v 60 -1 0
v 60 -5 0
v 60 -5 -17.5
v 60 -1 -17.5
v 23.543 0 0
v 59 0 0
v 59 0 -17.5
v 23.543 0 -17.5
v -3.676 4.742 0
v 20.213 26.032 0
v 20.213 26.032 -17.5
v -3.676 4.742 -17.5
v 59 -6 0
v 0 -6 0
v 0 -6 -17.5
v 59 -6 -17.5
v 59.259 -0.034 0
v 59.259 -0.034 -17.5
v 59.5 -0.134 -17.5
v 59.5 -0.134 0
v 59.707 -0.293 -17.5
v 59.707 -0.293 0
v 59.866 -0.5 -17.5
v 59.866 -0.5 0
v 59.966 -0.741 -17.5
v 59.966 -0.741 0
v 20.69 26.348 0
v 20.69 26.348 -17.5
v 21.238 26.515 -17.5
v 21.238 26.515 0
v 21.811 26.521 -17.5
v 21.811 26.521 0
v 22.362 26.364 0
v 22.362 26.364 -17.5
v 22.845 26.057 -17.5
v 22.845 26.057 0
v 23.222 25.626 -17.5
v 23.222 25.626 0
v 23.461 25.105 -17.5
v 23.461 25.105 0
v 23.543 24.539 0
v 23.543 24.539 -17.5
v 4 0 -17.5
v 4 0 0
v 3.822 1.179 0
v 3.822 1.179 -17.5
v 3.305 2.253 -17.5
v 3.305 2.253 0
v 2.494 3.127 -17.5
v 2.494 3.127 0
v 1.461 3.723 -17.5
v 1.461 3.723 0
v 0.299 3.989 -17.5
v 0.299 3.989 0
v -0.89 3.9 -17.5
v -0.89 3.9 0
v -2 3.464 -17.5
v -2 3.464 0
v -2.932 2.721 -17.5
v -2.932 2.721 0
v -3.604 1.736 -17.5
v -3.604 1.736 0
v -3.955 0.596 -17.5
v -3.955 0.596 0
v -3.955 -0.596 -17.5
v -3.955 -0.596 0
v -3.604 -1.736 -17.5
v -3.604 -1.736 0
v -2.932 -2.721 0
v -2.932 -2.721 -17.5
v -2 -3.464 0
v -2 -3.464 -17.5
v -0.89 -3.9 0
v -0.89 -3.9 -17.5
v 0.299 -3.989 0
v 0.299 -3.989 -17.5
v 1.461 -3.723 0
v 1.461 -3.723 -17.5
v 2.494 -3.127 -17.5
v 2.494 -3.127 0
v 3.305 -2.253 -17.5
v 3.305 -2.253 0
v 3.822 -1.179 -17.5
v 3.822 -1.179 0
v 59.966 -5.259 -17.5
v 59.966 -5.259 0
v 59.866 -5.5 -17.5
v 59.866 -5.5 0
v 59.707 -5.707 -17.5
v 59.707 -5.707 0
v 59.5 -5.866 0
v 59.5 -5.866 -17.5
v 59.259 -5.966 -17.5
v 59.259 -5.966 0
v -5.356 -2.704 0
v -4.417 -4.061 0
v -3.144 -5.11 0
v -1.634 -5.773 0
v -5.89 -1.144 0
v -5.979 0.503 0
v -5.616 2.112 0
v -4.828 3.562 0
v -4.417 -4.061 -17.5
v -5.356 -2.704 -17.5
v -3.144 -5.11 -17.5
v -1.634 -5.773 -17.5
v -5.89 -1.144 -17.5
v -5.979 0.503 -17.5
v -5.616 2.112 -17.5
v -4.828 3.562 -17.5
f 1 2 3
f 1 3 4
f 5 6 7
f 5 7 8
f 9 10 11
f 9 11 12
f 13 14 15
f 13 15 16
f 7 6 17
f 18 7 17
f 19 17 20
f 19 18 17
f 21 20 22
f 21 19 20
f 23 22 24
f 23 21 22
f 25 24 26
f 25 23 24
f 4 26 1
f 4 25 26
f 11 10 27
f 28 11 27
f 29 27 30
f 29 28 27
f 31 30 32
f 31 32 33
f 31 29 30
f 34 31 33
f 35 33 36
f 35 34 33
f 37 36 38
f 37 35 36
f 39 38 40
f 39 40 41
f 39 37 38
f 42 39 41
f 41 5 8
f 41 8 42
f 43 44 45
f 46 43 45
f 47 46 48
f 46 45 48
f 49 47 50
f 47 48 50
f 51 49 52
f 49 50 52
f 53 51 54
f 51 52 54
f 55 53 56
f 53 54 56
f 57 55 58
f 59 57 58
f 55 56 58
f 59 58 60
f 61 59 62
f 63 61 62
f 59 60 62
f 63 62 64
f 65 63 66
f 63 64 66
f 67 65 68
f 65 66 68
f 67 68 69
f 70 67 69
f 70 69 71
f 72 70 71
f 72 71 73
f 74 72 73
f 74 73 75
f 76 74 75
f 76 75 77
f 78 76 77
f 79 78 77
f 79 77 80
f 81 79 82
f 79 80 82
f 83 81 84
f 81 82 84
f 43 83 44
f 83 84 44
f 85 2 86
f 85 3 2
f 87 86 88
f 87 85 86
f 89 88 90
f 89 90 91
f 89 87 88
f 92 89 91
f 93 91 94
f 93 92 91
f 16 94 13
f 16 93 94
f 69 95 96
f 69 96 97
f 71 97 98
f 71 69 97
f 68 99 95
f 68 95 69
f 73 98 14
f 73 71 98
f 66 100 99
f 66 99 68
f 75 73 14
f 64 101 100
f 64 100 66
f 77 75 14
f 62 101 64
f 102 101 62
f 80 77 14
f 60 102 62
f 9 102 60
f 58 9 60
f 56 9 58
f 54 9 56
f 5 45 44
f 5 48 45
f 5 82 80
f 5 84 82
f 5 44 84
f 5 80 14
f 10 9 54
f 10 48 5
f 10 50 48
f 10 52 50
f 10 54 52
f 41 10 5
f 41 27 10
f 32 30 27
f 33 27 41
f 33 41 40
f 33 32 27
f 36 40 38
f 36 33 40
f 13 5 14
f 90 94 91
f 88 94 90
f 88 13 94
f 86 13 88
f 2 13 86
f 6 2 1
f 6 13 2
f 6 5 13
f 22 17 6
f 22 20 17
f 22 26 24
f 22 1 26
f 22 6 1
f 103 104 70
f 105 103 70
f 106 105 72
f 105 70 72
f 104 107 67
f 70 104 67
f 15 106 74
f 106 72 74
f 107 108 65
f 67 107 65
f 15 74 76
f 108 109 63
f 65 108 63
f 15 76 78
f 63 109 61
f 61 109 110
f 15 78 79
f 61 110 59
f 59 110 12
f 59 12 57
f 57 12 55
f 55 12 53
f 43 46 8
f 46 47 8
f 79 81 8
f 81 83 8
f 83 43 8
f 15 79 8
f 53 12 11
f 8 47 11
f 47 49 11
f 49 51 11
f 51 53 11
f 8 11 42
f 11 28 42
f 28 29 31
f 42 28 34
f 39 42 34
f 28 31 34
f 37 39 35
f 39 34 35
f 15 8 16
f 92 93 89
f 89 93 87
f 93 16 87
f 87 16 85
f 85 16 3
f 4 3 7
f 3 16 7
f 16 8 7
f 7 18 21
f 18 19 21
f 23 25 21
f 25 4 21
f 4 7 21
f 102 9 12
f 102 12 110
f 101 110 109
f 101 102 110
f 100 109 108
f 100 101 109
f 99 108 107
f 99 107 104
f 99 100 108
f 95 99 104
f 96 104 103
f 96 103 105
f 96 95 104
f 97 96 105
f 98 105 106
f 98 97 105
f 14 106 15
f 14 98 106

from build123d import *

# Parameters (mm, degrees)
ESQUISSE1_R        = 6
ESQUISSE1_R_2      = 4
BOSS_EXTRU_1_DEPTH = 17.5
CONG_2_R           = 2
CONG_3_R           = 1
CONG_4_R           = 1


with BuildPart() as part:
    # Esquisse1 → Boss.-Extru.1 (new body)
    # profile 1 of 2: a face of its own
    with BuildSketch(Plane.XY):
        Circle(ESQUISSE1_R)
        Circle(ESQUISSE1_R_2, mode=Mode.SUBTRACT)
    # profile 2 of 2: a face of its own
    with BuildSketch(Plane.XY):
        with BuildLine():
            Line((23.543392678, 29), (-3.675906783, 4.742120762))
            ThreePointArc((-3.675906783, 4.742120762), (2.640507461, 5.387737962), (6, 0))
            ThreePointArc((6, 0), (4.242640687, -4.242640687), (0, -6))
            Line((0, -6), (60, -6))
            Line((60, -6), (60, 0))
            Line((60, 0), (23.543392678, 0))
            Line((23.543392678, 0), (23.543392678, 29))
        make_face()
    extrude(amount=-BOSS_EXTRU_1_DEPTH)

    # Congé2
    cong_2_edges = [part.edges().sort_by_distance(p)[0] for p in [
        (23.543392678, 29, -8.75),
    ]]
    fillet(cong_2_edges, radius=CONG_2_R)

    # Congé3
    cong_3_edges = [part.edges().sort_by_distance(p)[0] for p in [
        (60, 0, -8.75),
    ]]
    fillet(cong_3_edges, radius=CONG_3_R)

    # Congé4
    cong_4_edges = [part.edges().sort_by_distance(p)[0] for p in [
        (60, -6, -8.75),
    ]]
    fillet(cong_4_edges, radius=CONG_4_R)


solid = part.part
